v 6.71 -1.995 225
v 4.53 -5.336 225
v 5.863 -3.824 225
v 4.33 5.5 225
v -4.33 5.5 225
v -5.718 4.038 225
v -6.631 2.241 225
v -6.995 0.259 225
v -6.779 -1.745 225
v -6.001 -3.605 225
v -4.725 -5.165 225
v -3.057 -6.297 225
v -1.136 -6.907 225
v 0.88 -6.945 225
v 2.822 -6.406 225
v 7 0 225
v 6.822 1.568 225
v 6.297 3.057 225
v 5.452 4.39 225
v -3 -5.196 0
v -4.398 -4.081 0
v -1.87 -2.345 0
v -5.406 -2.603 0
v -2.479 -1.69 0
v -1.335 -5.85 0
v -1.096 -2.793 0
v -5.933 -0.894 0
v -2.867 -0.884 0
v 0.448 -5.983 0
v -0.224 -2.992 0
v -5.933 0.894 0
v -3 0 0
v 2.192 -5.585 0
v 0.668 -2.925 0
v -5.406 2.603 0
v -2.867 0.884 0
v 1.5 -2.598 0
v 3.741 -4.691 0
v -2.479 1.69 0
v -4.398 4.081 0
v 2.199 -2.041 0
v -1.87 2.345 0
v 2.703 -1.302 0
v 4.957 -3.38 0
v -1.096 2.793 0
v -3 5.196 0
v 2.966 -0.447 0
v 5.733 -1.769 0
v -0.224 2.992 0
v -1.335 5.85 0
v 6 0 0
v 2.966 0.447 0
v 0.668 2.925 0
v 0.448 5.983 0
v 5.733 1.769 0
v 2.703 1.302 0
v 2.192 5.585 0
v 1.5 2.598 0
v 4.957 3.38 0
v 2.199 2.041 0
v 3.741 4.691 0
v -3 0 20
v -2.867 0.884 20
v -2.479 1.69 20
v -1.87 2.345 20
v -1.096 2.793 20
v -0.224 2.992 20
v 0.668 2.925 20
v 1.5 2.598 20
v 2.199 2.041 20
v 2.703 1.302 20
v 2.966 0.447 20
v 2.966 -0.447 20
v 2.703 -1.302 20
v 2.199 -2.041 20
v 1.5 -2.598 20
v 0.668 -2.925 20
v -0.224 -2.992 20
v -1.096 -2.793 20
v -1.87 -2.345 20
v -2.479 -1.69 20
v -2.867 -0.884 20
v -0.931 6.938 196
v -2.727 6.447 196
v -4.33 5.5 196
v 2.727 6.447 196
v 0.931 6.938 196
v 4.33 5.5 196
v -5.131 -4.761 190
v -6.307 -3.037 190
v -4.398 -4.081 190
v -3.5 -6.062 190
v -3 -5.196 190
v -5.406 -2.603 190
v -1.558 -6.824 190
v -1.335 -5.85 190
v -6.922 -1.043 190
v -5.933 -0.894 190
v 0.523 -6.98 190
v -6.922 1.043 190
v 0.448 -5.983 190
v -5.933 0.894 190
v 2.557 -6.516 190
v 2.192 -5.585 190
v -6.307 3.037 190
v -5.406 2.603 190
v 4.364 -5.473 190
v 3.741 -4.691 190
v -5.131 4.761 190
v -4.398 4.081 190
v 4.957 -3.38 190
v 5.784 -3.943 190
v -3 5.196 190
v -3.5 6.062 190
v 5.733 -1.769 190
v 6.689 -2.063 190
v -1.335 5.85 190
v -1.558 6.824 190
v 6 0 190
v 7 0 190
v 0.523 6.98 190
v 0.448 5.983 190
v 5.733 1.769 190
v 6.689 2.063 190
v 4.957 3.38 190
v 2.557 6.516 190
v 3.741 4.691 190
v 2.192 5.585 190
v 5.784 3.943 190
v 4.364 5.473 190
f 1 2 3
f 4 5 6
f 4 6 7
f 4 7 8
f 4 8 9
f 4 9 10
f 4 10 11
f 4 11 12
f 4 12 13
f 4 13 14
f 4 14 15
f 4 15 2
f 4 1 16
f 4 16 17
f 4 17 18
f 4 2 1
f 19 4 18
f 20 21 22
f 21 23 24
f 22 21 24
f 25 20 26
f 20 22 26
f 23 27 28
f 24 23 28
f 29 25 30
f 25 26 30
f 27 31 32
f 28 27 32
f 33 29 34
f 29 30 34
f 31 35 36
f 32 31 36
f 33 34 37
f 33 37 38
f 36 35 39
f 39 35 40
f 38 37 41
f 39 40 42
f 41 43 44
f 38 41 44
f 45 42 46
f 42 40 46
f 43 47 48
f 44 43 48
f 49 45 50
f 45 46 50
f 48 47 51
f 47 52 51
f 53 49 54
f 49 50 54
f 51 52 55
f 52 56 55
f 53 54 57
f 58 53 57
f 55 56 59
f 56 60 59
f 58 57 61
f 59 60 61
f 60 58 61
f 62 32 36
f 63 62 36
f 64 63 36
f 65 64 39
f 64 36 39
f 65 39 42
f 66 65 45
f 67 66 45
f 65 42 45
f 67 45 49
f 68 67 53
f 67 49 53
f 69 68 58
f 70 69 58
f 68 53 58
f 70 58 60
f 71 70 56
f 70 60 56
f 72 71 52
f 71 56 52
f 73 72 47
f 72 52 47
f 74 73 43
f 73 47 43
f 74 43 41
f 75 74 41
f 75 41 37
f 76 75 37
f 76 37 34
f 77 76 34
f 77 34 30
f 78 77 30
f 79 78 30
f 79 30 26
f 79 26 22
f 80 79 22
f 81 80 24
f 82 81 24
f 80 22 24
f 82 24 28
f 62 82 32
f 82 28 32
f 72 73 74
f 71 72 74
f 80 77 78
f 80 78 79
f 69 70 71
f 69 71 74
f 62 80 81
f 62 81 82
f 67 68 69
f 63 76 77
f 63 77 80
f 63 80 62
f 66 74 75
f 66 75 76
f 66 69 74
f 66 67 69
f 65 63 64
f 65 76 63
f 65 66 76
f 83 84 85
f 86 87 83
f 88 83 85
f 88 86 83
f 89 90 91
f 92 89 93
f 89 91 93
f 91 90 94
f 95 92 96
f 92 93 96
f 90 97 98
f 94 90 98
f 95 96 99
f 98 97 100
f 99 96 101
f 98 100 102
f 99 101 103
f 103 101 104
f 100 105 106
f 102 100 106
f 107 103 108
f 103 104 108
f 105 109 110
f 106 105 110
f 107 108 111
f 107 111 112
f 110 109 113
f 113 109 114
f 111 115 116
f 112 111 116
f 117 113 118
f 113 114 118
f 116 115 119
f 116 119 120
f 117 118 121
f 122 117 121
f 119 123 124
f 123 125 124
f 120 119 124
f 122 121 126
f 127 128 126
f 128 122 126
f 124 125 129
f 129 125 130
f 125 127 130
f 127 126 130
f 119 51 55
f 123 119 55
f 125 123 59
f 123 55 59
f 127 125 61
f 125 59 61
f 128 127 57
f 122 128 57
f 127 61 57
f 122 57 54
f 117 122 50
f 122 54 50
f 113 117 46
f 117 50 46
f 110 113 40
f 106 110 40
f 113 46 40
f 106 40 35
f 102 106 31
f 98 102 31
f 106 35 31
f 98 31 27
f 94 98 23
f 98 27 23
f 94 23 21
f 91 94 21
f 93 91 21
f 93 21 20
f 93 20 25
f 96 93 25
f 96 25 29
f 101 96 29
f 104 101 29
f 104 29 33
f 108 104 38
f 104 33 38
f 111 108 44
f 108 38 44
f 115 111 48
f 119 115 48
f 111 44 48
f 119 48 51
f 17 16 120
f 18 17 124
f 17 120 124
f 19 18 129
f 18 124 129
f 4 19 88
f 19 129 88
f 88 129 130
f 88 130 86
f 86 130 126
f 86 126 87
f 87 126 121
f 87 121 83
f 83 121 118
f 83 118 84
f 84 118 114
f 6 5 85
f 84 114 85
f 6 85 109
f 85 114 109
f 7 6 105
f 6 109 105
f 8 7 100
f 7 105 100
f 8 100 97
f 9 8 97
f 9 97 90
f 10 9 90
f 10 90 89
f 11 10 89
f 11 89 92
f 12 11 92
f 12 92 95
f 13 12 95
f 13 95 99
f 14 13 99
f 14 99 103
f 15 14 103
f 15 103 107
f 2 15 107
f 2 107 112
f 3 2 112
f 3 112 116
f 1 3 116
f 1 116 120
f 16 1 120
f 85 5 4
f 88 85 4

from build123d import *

# Parameters (mm, degrees)
ESQUISSE1_R             = 6
BOSS_EXTRU_1_DEPTH      = 190
ESQUISSE2_R             = 7
BOSS_EXTRU_2_DEPTH      = 35
ESQUISSE3_R             = 3
ENL_V_MAT_EXTRU_1_DEPTH = 20
ESQUISSE4_W             = 10.048379513
ESQUISSE4_H             = 5
ENL_V_MAT_EXTRU_2_DEPTH = 29


with BuildPart() as part:
    # Esquisse1 → Boss.-Extru.1 (new body)
    with BuildSketch(Plane.XY):
        Circle(ESQUISSE1_R)
    extrude(amount=BOSS_EXTRU_1_DEPTH)

    # Esquisse2 → Boss.-Extru.2 (add)
    with BuildSketch(Plane.XY.offset(190)):
        Circle(ESQUISSE2_R)
    extrude(amount=BOSS_EXTRU_2_DEPTH)

    # Esquisse3 → Enlèv. mat.-Extru.1 (cut)
    with BuildSketch(Plane(origin=(0, 0, 0), x_dir=(-1, 0, 0), z_dir=(0, 0, -1))):
        Circle(ESQUISSE3_R)
    extrude(amount=-ENL_V_MAT_EXTRU_1_DEPTH, mode=Mode.SUBTRACT)

    # Esquisse4 → Enlèv. mat.-Extru.2 (cut)
    with BuildSketch(Plane.XY.offset(225)):
        with Locations((0.381691631, 8)):
            Rectangle(ESQUISSE4_W, ESQUISSE4_H)
    extrude(amount=-ENL_V_MAT_EXTRU_2_DEPTH, mode=Mode.SUBTRACT)


solid = part.part
